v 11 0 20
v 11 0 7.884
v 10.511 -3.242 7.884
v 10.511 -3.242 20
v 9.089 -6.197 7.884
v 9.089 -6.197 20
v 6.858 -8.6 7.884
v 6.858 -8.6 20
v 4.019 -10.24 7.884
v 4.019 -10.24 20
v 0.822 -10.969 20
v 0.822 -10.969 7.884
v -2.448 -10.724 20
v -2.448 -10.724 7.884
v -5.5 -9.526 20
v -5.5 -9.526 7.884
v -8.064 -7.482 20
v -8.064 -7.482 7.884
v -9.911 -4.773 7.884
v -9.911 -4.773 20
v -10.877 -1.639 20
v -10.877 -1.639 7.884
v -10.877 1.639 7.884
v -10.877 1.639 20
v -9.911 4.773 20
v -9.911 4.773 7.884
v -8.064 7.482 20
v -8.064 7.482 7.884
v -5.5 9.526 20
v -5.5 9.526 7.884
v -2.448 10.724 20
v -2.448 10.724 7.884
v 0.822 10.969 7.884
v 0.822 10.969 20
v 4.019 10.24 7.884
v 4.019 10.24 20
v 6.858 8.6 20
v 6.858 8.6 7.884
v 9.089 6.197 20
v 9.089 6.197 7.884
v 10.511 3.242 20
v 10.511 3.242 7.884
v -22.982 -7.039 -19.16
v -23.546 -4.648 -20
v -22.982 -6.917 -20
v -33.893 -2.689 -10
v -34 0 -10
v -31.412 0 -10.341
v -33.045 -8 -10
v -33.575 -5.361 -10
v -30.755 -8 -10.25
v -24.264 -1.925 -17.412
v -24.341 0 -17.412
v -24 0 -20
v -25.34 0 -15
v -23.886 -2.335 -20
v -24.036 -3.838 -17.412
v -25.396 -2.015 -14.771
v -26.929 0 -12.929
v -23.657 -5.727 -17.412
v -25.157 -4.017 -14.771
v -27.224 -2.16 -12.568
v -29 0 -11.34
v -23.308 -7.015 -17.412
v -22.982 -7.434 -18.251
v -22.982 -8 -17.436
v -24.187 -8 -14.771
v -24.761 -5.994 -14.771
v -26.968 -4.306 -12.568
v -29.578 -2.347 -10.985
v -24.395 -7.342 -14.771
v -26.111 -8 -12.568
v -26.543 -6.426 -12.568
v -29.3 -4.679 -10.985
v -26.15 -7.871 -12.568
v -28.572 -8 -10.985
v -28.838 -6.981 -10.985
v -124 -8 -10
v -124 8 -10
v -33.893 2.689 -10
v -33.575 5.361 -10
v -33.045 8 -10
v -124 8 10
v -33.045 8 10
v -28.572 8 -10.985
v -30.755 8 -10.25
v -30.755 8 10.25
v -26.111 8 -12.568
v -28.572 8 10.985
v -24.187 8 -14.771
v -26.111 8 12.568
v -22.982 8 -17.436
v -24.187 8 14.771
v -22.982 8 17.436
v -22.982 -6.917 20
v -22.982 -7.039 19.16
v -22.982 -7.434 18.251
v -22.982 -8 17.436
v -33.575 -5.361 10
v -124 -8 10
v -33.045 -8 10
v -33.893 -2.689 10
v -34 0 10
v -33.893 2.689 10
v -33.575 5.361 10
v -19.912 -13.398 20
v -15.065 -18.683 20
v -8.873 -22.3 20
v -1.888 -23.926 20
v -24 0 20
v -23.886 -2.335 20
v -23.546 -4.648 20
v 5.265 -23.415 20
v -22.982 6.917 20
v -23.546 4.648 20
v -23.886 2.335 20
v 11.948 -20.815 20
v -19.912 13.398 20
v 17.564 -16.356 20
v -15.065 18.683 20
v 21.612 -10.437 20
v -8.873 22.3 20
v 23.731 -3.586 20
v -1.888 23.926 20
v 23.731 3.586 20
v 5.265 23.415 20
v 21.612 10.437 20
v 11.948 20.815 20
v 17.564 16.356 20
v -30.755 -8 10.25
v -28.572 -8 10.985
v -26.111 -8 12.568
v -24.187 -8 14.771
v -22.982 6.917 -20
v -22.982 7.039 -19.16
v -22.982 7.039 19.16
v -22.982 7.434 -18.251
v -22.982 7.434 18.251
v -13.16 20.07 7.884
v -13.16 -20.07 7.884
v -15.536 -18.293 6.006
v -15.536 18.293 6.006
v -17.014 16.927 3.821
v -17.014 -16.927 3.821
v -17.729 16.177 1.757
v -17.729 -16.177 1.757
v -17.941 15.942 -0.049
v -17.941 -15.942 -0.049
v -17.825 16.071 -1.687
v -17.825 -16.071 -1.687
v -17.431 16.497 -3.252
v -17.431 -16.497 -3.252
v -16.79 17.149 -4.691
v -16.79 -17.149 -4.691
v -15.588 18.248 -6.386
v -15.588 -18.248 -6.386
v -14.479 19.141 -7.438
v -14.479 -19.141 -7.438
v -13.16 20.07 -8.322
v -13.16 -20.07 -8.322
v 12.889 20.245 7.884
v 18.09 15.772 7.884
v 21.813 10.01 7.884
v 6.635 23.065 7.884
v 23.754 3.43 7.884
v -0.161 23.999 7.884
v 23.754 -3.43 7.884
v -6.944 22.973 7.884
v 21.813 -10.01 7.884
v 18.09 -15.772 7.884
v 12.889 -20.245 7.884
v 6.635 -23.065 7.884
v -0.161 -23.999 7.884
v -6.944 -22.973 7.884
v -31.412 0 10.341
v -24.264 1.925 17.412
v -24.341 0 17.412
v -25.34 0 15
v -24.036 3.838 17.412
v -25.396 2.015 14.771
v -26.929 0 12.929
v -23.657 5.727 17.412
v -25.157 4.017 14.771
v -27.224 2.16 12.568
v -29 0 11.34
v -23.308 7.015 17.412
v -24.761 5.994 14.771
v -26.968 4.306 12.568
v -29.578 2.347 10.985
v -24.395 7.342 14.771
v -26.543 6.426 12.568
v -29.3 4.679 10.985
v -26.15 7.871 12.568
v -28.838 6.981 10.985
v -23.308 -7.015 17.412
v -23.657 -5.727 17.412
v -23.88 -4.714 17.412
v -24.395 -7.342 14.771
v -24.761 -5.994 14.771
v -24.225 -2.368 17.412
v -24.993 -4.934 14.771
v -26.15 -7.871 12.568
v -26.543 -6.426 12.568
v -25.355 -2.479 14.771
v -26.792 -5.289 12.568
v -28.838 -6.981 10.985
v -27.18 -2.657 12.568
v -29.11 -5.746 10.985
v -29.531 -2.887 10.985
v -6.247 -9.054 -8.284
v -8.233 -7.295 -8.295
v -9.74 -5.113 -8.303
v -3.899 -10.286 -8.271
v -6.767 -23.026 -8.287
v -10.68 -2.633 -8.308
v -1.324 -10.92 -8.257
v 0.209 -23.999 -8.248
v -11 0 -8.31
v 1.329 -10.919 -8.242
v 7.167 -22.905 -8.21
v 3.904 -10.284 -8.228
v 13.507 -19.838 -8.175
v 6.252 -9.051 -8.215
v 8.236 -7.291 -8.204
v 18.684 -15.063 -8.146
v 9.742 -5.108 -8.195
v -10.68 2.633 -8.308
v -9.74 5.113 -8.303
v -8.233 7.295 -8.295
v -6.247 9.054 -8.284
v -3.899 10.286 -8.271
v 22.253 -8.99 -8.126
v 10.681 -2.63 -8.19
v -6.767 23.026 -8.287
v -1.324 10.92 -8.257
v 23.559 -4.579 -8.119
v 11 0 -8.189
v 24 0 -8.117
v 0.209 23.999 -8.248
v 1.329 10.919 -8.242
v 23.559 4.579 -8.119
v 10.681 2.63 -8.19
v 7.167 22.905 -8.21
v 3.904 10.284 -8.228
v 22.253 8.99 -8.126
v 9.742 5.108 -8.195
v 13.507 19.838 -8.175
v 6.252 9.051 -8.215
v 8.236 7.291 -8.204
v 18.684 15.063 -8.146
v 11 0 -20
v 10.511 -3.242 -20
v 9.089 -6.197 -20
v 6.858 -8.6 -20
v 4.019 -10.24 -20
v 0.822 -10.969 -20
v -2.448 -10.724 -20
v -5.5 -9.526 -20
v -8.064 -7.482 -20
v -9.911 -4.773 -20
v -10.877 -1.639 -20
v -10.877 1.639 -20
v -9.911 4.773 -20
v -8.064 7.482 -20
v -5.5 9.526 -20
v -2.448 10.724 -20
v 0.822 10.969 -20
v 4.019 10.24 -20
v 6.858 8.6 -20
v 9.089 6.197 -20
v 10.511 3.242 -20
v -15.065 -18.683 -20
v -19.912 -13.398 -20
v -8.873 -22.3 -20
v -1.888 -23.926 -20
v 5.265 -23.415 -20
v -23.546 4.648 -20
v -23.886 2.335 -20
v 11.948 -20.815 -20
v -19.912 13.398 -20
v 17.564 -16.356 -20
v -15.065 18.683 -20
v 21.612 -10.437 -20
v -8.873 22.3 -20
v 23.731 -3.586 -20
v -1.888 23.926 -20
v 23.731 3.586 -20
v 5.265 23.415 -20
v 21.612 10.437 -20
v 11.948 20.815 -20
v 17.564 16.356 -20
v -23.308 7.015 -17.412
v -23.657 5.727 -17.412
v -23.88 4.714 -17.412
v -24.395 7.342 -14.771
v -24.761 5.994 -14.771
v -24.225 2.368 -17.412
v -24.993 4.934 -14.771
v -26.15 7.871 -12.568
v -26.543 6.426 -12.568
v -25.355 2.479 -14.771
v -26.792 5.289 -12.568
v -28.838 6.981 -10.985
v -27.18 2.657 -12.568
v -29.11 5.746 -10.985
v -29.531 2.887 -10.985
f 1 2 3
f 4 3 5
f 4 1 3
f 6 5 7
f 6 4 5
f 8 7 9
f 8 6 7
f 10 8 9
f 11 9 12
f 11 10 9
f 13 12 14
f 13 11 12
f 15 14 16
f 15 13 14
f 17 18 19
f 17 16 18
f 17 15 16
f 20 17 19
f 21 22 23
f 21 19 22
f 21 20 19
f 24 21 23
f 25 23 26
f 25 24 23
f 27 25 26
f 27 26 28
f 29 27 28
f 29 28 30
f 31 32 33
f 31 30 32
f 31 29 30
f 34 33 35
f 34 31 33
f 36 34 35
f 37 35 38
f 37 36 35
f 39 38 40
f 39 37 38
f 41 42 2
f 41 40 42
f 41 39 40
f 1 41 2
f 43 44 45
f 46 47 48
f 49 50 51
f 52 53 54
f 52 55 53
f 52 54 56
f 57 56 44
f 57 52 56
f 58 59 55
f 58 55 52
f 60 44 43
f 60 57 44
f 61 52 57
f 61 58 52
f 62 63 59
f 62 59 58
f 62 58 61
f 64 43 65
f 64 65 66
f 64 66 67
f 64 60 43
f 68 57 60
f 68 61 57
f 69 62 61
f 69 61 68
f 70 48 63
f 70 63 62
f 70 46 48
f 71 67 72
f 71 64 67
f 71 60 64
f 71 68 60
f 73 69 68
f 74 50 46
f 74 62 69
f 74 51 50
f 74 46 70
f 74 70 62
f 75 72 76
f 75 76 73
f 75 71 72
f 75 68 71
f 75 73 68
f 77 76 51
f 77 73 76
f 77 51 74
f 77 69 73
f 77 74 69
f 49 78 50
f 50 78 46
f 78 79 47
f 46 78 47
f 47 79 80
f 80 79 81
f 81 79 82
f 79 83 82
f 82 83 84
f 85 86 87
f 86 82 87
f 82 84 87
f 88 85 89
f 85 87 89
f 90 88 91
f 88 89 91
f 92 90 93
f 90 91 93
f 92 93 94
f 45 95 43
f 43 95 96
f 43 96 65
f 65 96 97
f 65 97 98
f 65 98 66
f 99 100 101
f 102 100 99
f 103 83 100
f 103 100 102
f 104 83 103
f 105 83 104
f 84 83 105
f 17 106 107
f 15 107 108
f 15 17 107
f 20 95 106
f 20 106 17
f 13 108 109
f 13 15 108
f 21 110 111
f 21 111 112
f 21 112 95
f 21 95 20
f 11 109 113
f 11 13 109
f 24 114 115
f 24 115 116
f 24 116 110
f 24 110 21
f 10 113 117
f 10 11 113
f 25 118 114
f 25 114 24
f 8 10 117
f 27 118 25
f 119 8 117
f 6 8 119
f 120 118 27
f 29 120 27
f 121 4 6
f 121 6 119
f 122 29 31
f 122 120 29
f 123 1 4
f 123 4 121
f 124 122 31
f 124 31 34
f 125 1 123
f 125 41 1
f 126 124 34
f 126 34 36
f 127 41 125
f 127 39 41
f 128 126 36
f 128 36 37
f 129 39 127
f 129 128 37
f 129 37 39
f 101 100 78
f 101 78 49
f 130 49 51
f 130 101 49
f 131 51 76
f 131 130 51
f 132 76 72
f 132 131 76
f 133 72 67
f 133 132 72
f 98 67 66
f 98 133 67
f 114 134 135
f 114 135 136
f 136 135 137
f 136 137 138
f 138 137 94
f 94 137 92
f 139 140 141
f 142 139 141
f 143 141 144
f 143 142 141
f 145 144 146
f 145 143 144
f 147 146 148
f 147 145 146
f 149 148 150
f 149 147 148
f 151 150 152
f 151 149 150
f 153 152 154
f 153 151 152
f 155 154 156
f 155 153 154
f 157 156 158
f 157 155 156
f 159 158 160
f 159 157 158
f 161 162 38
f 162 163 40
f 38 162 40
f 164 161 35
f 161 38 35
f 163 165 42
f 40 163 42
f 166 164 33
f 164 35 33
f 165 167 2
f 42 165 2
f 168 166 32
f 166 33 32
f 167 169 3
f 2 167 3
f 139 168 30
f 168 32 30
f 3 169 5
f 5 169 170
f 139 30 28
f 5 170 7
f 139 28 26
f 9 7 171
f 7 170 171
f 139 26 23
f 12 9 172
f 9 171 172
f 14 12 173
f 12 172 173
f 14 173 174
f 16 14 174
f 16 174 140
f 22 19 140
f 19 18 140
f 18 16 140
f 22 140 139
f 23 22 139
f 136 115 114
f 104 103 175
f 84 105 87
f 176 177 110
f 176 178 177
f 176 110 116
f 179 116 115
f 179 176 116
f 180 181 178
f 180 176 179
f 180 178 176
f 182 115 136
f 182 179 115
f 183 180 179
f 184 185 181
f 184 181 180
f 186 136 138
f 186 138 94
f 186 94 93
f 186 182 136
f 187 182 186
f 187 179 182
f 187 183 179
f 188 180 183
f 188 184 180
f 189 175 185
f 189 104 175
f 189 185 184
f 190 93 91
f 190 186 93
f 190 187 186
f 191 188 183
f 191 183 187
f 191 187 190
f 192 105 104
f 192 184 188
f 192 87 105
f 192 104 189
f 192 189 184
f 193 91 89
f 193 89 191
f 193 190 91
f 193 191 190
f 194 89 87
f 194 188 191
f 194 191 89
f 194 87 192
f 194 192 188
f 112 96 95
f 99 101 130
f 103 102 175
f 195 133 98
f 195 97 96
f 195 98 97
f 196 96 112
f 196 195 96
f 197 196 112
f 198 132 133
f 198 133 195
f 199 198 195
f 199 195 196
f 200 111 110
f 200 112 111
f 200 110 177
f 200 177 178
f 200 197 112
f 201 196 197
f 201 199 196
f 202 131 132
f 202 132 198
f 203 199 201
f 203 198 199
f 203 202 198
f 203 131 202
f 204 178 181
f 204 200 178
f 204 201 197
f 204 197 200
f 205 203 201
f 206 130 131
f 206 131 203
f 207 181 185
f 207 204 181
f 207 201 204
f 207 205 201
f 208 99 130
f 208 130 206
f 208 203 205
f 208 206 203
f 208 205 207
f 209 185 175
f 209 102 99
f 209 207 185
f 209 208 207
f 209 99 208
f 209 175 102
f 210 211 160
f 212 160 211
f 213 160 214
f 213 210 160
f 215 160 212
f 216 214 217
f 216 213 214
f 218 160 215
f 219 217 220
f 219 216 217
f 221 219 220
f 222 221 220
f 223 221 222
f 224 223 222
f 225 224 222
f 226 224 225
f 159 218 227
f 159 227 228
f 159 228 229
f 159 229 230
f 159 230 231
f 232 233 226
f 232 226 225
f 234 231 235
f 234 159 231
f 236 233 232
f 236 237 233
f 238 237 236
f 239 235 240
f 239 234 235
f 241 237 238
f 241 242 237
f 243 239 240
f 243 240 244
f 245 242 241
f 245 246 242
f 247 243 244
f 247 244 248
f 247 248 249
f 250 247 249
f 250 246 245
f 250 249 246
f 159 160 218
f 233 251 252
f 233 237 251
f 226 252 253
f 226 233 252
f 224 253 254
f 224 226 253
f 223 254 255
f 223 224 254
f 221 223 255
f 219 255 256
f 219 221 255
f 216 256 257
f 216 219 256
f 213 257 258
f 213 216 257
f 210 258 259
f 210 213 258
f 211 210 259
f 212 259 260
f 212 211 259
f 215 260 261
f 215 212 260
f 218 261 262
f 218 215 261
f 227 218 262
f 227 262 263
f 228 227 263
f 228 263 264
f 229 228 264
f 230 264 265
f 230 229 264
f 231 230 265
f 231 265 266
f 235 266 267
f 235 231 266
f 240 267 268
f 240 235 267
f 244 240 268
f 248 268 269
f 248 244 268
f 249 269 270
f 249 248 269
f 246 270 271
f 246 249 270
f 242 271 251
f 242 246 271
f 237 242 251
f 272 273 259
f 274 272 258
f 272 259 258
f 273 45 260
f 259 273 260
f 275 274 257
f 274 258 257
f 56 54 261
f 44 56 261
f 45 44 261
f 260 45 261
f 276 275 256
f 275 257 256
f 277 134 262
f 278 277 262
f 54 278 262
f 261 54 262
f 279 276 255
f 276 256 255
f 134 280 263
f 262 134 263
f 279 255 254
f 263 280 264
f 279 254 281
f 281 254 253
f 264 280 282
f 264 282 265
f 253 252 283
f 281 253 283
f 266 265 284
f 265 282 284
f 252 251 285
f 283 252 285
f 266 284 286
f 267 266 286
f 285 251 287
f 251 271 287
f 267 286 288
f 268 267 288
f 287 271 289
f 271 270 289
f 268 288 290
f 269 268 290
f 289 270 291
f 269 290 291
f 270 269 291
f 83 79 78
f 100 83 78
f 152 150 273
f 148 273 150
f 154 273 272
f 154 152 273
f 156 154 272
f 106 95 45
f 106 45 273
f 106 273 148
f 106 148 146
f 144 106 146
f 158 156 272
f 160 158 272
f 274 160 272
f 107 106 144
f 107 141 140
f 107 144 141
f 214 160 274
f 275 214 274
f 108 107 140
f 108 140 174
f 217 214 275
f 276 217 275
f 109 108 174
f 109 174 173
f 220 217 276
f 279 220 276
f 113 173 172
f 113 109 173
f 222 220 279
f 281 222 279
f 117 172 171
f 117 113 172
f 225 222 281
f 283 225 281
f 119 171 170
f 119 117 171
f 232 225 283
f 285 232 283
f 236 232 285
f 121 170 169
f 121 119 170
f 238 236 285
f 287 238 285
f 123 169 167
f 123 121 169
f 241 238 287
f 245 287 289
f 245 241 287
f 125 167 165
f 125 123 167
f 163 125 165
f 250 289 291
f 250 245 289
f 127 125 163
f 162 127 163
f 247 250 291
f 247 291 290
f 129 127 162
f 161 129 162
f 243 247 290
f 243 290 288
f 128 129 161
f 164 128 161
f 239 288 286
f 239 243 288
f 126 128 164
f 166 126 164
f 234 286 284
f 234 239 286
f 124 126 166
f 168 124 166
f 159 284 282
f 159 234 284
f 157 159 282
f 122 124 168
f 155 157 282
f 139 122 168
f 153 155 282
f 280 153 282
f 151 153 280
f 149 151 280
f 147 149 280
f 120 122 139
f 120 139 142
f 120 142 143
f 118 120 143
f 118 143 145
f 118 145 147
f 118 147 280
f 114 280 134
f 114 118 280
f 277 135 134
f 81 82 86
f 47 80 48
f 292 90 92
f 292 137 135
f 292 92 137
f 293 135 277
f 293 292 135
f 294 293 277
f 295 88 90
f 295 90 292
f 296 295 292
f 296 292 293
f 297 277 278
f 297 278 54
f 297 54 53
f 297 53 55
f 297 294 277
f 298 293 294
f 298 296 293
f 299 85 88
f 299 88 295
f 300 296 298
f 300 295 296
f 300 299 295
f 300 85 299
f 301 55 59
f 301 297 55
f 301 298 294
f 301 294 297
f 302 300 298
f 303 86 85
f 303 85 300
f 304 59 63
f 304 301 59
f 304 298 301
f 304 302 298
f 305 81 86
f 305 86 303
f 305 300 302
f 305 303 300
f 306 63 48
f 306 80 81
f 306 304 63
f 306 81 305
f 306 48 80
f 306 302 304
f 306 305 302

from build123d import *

# Parameters (mm, degrees)
F1_DEPTH      = 20
F1_DEPTH_BACK = 20
F3_DEPTH      = 10
F3_DEPTH_BACK = 10
F5_DEPTH      = 25
F5_DEPTH_BACK = 25
F6_T4_ANGLE   = 76.4346442218
F6_T10_ANGLE  = 76.4346442218
F6_T16_ANGLE  = 76.4346442218
F6_T22_ANGLE  = 76.4346442218


# Not quite as in the source:
# - a fillet or chamfer that OpenCascade refuses, or shapes differently, is made with other operations: its cross-section is extruded or revolved along the edge and cut away or added
# - two fillets or chamfers of one size are made in one step


with BuildPart() as f1:
    # F0 (on Top) → F1 (new body, two sides)
    with BuildSketch(Plane.XY) as f1_sk:
        with BuildLine():
            Line((11, 0), (24, 0))
            ThreePointArc((24, 0), (0, 24), (-24, 0))
            Line((-24, 0), (-11, 0))
            ThreePointArc((-11, 0), (0, 11), (11, 0))
        make_face()
        with BuildLine():
            ThreePointArc((-24, 0), (0, -24), (24, 0))
            Line((24, 0), (11, 0))
            ThreePointArc((11, 0), (0, -11), (-11, 0))
            Line((-11, 0), (-24, 0))
        make_face()
    extrude(amount=F1_DEPTH)
    extrude(f1_sk.sketch, amount=-F1_DEPTH_BACK)

    # F2 (on Top) → F3 (join, two sides)
    with BuildSketch(Plane.XY) as f3_sk:
        Polygon((-124.000001856, 8), (-124.000001856, 0), (-124.000001856, -8), (-22.981626913, -8), (-22.981626913, 8), align=None)
    extrude(amount=F3_DEPTH)
    extrude(f3_sk.sketch, amount=-F3_DEPTH_BACK)

    # F4 (on Front) → F5 (cut, two sides)
    with BuildSketch(Plane.XZ) as f5_sk:
        with BuildLine():
            Line((-13.159872964, -8.3219918372), (24.1259910374, -8.1159918464))
            Line((24.1259910374, -8.1159918464), (24.037594278, 7.8837639647))
            Line((24.037594278, 7.8837639647), (-13.159872964, 7.8837639647))
            ThreePointArc((-13.159872964, 7.8837639647), (-17.9421277203, -0.2191139363), (-13.159872964, -8.3219918372))
        make_face()
    extrude(amount=-F5_DEPTH, mode=Mode.SUBTRACT)
    extrude(f5_sk.sketch, amount=F5_DEPTH_BACK, mode=Mode.SUBTRACT)

    # F6: fillet of radius 10 on 4 edges, made by hand


with BuildPart() as f6_tool2:
    # F6_s3 → F6_t4 (revolve)
    with BuildSketch(Plane(origin=(0, 0, 0), x_dir=(0, 0, 1), z_dir=(0.9721030029, -0.2345543684, 0))):
        with BuildLine():
            ThreePointArc((20, 24), (12.9289321881, 26.9289321881), (10, 34))
            Line((10, 34), (10, 24))
            Line((10, 24), (20, 24))
        make_face()
    revolve(axis=Axis((0, 0, 10), (0, 0, -1)), revolution_arc=F6_T4_ANGLE)

    split(bisect_by=Plane.XZ.offset(8), keep=Keep.BOTTOM)

    split(bisect_by=Plane.YZ.offset(-22.981626913), keep=Keep.BOTTOM)


with BuildPart() as f1_1:
    add(f1.part)

    # F6_t1: union F6_tool2
    add(f6_tool2.part)


with BuildPart() as f6_tool8:
    # F6_s9 → F6_t10 (revolve)
    with BuildSketch(Plane.XZ):
        with BuildLine():
            ThreePointArc((-24, 20), (-26.9289321881, 12.9289321881), (-34, 10))
            Line((-34, 10), (-24, 10))
            Line((-24, 10), (-24, 20))
        make_face()
    revolve(axis=Axis((0, 0, 10), (0, 0, -1)), revolution_arc=F6_T10_ANGLE)

    split(bisect_by=Plane.XZ.offset(-8), keep=Keep.TOP)

    split(bisect_by=Plane.YZ.offset(-22.981626913), keep=Keep.BOTTOM)


with BuildPart() as f1_2:
    add(f1_1.part)

    # F6_t7: union F6_tool8
    add(f6_tool8.part)


with BuildPart() as f6_tool14:
    # F6_s15 → F6_t16 (revolve)
    with BuildSketch(Plane(origin=(0, 0, 0), x_dir=(0, 0, 1), z_dir=(0.9721030029, 0.2345543684, 0))):
        with BuildLine():
            ThreePointArc((-20, -24), (-12.9289321881, -26.9289321881), (-10, -34))
            Line((-10, -34), (-10, -24))
            Line((-10, -24), (-20, -24))
        make_face()
    revolve(axis=Axis((0, 0, -10), (0, 0, 1)), revolution_arc=F6_T16_ANGLE)

    split(bisect_by=Plane.XZ.offset(-8), keep=Keep.TOP)

    split(bisect_by=Plane.YZ.offset(-22.981626913), keep=Keep.BOTTOM)


with BuildPart() as f1_3:
    add(f1_2.part)

    # F6_t13: union F6_tool14
    add(f6_tool14.part)


with BuildPart() as f6_tool20:
    # F6_s21 → F6_t22 (revolve)
    with BuildSketch(Plane.XZ):
        with BuildLine():
            ThreePointArc((-24, -20), (-26.9289321881, -12.9289321881), (-34, -10))
            Line((-34, -10), (-24, -10))
            Line((-24, -10), (-24, -20))
        make_face()
    revolve(axis=Axis((0, 0, -10), (0, 0, 1)), revolution_arc=F6_T22_ANGLE)

    split(bisect_by=Plane.XZ.offset(8), keep=Keep.BOTTOM)

    split(bisect_by=Plane.YZ.offset(-22.981626913), keep=Keep.BOTTOM)


with BuildPart() as f1_4:
    add(f1_3.part)

    # F6_t19: union F6_tool20
    add(f6_tool20.part)


solid = f1_4.part
